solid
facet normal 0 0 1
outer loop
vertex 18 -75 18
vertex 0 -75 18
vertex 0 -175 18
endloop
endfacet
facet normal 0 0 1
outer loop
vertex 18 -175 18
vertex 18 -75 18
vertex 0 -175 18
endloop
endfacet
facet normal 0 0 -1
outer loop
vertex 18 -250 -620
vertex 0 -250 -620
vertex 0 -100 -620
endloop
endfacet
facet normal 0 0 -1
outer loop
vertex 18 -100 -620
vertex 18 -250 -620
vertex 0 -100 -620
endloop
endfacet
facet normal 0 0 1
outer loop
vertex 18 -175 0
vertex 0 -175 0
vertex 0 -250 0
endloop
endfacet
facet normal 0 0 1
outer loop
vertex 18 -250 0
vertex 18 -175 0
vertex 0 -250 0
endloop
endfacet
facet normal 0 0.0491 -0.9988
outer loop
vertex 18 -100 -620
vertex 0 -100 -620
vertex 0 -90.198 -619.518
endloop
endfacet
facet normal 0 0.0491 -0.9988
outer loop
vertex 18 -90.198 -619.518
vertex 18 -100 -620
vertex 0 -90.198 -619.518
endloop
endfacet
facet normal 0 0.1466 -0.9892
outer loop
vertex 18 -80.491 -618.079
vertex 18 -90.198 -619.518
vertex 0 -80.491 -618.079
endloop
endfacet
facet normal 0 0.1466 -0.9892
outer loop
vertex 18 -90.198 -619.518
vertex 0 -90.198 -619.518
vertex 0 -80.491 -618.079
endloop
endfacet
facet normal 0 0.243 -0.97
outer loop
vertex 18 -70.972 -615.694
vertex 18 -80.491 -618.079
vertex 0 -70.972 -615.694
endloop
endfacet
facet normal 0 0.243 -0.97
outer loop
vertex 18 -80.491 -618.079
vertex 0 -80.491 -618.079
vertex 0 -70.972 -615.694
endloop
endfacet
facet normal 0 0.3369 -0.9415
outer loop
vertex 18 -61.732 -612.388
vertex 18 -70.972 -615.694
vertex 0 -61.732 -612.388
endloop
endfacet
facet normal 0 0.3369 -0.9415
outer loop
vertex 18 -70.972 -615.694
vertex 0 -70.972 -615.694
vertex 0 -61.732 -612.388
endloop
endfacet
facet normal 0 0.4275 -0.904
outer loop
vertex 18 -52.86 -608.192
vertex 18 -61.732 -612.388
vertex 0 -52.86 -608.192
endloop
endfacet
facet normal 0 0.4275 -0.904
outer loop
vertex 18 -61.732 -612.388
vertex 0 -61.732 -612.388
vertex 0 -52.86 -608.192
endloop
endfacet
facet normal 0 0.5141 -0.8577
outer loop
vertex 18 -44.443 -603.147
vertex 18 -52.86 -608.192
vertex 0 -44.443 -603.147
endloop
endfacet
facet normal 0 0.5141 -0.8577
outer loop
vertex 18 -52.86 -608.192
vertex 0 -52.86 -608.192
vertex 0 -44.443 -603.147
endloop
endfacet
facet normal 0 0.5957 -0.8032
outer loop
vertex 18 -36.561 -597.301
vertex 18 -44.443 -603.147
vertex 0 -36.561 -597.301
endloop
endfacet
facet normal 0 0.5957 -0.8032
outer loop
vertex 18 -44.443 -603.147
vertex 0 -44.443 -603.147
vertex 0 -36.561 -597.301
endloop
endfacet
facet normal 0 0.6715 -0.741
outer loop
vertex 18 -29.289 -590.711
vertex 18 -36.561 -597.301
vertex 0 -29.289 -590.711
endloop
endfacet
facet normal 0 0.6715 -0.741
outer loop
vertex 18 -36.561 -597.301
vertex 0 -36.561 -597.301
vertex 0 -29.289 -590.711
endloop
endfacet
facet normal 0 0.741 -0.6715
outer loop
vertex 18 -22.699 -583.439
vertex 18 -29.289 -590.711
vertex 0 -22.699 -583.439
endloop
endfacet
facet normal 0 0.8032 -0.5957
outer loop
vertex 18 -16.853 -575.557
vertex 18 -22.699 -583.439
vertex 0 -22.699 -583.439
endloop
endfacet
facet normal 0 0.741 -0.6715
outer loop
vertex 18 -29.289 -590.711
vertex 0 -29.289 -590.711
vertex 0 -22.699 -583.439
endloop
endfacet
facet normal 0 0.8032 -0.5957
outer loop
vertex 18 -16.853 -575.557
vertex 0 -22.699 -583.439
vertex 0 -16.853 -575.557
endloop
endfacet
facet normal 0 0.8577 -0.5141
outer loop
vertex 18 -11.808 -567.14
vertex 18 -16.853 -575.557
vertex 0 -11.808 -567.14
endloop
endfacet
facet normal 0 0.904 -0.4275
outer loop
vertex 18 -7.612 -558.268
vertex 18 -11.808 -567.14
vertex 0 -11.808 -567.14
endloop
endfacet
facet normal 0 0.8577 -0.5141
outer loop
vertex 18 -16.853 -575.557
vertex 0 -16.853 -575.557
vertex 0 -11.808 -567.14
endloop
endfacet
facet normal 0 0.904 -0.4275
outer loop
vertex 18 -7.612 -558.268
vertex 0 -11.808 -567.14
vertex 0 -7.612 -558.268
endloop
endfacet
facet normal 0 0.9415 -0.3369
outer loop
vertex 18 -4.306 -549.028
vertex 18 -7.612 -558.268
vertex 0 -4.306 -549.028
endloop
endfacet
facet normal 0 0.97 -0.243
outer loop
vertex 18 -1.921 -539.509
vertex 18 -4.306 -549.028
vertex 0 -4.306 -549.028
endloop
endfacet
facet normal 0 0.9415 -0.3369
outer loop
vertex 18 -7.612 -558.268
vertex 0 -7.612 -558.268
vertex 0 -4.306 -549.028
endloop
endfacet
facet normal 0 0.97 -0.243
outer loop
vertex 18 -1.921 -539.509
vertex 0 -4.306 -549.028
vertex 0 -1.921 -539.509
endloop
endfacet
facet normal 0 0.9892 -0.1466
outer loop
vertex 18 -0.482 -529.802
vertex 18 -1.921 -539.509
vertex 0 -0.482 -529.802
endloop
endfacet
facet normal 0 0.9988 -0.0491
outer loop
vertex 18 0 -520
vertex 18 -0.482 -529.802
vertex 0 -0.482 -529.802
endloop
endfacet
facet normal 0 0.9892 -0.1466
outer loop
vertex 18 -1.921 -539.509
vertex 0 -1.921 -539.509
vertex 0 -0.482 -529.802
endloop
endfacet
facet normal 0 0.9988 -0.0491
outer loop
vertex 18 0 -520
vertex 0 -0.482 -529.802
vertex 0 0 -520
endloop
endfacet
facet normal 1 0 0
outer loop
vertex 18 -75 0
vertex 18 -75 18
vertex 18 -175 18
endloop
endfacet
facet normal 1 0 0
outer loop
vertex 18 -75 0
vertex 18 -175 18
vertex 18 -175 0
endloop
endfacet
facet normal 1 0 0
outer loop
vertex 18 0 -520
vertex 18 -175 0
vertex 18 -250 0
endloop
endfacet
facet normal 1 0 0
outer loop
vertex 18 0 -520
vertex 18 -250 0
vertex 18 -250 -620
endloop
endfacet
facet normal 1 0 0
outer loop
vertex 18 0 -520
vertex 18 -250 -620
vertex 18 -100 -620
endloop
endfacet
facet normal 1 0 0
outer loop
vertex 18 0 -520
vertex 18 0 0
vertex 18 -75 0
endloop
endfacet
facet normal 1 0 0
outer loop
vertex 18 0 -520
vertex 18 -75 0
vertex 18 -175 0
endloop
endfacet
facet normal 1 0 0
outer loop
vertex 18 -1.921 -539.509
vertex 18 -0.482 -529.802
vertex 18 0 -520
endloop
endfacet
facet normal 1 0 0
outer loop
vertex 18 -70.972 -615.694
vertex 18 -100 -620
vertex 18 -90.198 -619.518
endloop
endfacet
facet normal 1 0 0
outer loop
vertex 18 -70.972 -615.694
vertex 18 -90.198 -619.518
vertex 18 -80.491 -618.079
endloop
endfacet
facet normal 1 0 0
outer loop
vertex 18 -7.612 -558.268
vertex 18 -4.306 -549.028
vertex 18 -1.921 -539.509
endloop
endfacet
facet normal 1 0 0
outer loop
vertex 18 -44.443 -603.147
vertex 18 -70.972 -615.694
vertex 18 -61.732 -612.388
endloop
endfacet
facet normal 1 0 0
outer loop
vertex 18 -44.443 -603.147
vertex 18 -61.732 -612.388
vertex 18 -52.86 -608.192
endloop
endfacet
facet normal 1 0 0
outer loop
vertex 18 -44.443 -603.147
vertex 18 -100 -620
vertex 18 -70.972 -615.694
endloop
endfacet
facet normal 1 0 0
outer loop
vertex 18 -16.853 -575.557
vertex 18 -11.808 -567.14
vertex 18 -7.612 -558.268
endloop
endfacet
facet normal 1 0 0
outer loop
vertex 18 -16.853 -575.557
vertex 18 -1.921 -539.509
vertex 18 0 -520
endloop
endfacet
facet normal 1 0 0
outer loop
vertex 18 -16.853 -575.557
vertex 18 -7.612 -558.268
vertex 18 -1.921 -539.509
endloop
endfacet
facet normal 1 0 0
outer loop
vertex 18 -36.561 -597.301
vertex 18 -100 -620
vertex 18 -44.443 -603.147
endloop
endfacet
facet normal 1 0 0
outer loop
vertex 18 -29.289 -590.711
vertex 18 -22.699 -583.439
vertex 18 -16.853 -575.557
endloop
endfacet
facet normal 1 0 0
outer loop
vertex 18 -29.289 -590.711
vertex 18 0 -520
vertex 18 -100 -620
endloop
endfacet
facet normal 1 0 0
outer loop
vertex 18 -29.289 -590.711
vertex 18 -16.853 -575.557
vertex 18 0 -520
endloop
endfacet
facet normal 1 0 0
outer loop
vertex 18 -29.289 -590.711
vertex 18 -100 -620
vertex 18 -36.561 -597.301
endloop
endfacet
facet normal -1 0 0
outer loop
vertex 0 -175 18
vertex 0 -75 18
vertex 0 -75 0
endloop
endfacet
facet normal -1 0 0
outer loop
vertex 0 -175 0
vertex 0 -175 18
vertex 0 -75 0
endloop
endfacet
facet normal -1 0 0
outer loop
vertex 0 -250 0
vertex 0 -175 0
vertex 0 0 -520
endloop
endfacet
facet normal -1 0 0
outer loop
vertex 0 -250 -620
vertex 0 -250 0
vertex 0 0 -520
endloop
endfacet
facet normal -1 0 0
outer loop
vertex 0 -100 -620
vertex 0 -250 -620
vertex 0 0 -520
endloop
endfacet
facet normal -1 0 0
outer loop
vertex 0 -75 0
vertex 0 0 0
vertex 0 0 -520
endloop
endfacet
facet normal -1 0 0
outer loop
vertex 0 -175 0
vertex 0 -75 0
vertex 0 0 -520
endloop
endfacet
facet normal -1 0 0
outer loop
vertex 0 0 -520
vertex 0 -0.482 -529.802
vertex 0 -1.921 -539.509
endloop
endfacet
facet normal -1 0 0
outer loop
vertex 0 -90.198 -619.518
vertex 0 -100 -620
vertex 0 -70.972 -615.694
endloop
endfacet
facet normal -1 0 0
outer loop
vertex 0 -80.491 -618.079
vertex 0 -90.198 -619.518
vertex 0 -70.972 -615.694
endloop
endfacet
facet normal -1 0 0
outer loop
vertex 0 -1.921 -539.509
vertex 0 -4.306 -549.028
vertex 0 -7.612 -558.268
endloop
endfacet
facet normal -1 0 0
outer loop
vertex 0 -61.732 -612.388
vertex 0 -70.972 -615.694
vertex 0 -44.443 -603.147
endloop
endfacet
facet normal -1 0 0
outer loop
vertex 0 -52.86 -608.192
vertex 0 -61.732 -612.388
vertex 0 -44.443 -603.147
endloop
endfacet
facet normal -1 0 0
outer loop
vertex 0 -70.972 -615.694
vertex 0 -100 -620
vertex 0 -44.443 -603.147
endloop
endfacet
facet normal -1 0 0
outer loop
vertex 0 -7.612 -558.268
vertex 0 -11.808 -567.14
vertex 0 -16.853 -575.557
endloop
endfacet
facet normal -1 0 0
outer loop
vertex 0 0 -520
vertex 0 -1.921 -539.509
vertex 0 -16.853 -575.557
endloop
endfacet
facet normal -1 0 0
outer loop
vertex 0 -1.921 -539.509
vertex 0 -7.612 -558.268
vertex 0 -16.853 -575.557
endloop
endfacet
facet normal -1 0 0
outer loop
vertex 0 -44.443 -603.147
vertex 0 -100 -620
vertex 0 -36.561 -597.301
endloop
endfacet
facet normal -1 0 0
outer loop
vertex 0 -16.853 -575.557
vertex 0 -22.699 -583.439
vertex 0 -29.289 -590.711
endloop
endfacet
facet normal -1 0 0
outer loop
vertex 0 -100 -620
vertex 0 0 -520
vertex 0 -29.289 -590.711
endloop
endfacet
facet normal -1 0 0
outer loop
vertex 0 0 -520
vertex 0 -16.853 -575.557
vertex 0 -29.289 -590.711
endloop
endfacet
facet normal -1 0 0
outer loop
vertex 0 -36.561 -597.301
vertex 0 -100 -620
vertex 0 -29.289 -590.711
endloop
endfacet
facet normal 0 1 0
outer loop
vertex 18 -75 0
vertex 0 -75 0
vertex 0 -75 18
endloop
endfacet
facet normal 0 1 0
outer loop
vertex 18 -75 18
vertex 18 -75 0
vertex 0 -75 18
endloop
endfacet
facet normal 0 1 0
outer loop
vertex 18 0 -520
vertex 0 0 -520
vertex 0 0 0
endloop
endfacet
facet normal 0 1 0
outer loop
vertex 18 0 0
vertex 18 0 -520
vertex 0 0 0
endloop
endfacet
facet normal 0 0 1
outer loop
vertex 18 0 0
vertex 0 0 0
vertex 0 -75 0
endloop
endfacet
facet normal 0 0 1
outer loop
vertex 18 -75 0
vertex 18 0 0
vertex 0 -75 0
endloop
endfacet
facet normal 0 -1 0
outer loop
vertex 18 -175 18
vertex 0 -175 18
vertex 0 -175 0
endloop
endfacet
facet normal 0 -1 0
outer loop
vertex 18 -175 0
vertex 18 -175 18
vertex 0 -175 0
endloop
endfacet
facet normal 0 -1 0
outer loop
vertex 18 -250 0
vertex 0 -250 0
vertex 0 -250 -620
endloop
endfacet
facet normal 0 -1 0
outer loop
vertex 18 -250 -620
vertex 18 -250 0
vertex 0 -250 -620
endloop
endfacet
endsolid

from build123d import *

# Parameters (mm, degrees)
BOSS_EXTRUDE1_DEPTH = 18


with BuildPart() as part:
    # Sketch1 → Boss-Extrude1 (new body)
    with BuildSketch(Plane(origin=(0, 0, 0), x_dir=(0, 0, -1), z_dir=(1, 0, 0))):
        with BuildLine():
            Line((0, -175), (0, -250))
            Line((0, -250), (620, -250))
            Line((620, -250), (620, -100))
            ThreePointArc((620, -100), (590.710678119, -29.289321881), (520, 0))
            Line((520, 0), (0, 0))
            Line((0, 0), (0, -75))
            Line((0, -75), (-18, -75))
            Line((-18, -75), (-18, -175))
            Line((-18, -175), (0, -175))
        make_face()
    extrude(amount=BOSS_EXTRUDE1_DEPTH)


solid = part.part
